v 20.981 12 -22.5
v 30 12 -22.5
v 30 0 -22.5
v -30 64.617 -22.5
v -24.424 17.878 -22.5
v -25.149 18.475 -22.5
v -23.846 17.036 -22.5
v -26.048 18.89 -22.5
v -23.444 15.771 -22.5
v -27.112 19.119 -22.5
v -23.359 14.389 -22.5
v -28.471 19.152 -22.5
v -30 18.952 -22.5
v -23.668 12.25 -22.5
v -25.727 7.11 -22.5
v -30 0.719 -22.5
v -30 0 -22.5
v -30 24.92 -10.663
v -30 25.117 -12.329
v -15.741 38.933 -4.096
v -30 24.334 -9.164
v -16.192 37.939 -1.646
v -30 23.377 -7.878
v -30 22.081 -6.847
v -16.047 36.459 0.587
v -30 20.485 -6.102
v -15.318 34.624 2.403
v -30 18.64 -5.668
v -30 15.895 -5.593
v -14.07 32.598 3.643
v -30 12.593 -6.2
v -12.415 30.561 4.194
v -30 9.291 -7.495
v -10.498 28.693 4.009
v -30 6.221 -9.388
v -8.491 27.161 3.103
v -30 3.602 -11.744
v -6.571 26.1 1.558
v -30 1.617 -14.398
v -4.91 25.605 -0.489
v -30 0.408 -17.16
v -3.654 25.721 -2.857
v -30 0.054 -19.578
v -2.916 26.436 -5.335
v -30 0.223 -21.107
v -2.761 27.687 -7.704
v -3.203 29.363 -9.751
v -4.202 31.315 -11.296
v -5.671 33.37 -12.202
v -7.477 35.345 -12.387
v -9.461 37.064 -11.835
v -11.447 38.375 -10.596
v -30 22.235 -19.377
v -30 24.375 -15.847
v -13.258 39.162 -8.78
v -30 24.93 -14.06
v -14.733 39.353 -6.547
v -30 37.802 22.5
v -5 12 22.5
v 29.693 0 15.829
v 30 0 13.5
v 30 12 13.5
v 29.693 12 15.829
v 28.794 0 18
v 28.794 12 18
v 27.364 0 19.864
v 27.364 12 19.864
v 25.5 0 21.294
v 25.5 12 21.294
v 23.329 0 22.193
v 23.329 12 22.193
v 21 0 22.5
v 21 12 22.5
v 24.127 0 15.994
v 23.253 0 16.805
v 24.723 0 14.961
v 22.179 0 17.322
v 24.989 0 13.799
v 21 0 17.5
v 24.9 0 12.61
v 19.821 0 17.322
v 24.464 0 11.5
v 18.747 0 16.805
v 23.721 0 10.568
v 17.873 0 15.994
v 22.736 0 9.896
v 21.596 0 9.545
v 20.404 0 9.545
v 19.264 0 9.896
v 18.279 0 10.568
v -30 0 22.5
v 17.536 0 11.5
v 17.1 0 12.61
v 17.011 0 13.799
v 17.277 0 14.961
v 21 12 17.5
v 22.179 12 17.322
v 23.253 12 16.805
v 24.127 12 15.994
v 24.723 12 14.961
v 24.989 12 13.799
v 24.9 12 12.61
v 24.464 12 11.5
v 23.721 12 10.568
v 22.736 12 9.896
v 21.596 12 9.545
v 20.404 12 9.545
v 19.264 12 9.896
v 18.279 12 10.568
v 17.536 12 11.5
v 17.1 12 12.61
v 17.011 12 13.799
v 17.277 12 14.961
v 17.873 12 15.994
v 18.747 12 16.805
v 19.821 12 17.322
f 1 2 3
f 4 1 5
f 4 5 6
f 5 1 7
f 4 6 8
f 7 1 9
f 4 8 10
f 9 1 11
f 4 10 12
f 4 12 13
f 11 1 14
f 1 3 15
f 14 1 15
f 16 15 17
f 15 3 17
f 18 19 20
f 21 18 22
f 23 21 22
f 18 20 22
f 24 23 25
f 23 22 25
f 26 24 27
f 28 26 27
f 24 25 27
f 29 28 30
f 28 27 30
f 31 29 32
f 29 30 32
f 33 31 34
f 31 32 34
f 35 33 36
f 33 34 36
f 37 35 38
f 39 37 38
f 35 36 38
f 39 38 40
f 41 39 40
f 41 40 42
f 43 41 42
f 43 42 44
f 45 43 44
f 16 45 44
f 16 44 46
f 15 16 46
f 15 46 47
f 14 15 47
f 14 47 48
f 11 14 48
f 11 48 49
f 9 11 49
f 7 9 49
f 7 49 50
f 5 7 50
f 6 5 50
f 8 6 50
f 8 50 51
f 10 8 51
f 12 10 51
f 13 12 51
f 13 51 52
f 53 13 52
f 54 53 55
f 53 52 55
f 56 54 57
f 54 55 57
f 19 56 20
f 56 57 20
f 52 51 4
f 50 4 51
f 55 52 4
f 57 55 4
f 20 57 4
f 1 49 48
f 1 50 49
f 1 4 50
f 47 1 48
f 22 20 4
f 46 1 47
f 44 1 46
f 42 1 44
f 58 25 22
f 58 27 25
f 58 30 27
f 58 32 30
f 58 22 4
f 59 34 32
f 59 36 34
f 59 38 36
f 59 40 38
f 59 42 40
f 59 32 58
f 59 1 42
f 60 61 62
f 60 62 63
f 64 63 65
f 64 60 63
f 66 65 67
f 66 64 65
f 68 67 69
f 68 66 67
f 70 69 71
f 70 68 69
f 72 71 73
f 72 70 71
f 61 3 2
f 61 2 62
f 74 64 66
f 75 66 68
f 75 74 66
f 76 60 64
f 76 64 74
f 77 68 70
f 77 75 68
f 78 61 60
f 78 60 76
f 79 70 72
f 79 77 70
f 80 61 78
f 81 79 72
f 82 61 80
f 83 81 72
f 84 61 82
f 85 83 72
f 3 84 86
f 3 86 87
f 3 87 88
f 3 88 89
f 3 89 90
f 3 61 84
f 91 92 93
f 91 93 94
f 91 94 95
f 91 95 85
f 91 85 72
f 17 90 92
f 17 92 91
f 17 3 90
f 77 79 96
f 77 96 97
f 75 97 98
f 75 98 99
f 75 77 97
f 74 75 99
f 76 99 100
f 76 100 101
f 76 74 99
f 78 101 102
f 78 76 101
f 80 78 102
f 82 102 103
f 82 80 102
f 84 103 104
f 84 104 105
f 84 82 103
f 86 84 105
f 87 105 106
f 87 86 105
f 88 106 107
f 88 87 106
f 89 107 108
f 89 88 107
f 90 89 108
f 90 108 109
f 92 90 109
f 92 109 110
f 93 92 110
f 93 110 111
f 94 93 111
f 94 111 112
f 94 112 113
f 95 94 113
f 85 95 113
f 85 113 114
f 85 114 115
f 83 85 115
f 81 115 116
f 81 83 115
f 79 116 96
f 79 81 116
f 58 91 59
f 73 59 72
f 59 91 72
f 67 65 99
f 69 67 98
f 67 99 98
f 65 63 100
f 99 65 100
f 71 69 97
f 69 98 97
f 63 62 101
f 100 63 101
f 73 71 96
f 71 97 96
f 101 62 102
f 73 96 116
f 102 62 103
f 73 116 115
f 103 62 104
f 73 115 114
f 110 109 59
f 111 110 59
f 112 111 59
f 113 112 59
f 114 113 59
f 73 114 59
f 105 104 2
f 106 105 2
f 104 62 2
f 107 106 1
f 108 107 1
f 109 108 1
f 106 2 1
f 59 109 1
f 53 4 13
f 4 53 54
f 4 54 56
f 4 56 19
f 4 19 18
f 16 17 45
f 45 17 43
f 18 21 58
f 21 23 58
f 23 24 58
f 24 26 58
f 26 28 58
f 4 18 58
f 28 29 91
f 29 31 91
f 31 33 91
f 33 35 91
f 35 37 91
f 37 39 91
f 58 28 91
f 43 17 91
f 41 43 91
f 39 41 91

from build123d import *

# Parameters (mm, degrees)
SKETCH_1_R          = 4
EXTRUDE_1_DEPTH     = 12
EXTRUDE_2_DEPTH     = 55
CUT_EXTRUDE_1_DEPTH = 50
SKETCH_9_R          = 9
CUT_EXTRUDE_2_DEPTH = 74.567594408


with BuildPart() as part:
    # 草图1 → 凸台-拉伸1 (new body)
    with BuildSketch(Plane(origin=(0, 0, 0), x_dir=(1, 0, 0), z_dir=(0, 1, 0))):
        with BuildLine():
            Line((-30, 22.5), (30, 22.5))
            Line((30, 22.5), (30, -13.5))
            ThreePointArc((30, -13.5), (27.363961031, -19.863961031), (21, -22.5))
            Line((21, -22.5), (-30, -22.5))
            Line((-30, -22.5), (-30, 22.5))
        make_face()
        with Locations(Location((21, -13.5, 0), (0, 0, 270))):
            Circle(SKETCH_1_R, mode=Mode.SUBTRACT)
    extrude(amount=EXTRUDE_1_DEPTH)

    # 草图5 → 凸台-拉伸2 (add)
    with BuildSketch(Plane(origin=(0, 12, 0), x_dir=(1, 0, 0), z_dir=(0, 1, 0))):
        Polygon((-5, -22.5), (20.980762114, 22.5), (-30, 22.5), (-30, -22.5), align=None)
    extrude(amount=EXTRUDE_2_DEPTH)

    # 草图6 → 切除-拉伸1 (cut)
    with BuildSketch(Plane(origin=(8.633922254, 8.365483215, 4.984797338), x_dir=(0.4999999999999977, 0, -0.86602540378444), z_dir=(-0.6634139481689368, -0.642787609686543, -0.3830222215594858))):
        Polygon((-21.985571585, -4.744524705), (29.975952642, -4.744524705), (46.861281787, -7.759213518), (18.600754365, -97.120116912), (-55.184549729, -73.785397471), align=None)
    extrude(amount=-CUT_EXTRUDE_1_DEPTH, mode=Mode.SUBTRACT)

    # 草图9 → 切除-拉伸2 (cut, through all)
    with BuildSketch(Plane(origin=(8.633922254, 8.365483215, 4.984797338), x_dir=(0.27508013503084955, 0.2665275624016649, -0.9237391286459811), z_dir=(0.663413948168937, 0.6427876096865428, 0.38302222155948573))):
        with Locations(Location((9.830913468, 29.914425108, 0), (0, 0, 90))):
            Circle(SKETCH_9_R)
    extrude(amount=-CUT_EXTRUDE_2_DEPTH, mode=Mode.SUBTRACT)


solid = part.part
